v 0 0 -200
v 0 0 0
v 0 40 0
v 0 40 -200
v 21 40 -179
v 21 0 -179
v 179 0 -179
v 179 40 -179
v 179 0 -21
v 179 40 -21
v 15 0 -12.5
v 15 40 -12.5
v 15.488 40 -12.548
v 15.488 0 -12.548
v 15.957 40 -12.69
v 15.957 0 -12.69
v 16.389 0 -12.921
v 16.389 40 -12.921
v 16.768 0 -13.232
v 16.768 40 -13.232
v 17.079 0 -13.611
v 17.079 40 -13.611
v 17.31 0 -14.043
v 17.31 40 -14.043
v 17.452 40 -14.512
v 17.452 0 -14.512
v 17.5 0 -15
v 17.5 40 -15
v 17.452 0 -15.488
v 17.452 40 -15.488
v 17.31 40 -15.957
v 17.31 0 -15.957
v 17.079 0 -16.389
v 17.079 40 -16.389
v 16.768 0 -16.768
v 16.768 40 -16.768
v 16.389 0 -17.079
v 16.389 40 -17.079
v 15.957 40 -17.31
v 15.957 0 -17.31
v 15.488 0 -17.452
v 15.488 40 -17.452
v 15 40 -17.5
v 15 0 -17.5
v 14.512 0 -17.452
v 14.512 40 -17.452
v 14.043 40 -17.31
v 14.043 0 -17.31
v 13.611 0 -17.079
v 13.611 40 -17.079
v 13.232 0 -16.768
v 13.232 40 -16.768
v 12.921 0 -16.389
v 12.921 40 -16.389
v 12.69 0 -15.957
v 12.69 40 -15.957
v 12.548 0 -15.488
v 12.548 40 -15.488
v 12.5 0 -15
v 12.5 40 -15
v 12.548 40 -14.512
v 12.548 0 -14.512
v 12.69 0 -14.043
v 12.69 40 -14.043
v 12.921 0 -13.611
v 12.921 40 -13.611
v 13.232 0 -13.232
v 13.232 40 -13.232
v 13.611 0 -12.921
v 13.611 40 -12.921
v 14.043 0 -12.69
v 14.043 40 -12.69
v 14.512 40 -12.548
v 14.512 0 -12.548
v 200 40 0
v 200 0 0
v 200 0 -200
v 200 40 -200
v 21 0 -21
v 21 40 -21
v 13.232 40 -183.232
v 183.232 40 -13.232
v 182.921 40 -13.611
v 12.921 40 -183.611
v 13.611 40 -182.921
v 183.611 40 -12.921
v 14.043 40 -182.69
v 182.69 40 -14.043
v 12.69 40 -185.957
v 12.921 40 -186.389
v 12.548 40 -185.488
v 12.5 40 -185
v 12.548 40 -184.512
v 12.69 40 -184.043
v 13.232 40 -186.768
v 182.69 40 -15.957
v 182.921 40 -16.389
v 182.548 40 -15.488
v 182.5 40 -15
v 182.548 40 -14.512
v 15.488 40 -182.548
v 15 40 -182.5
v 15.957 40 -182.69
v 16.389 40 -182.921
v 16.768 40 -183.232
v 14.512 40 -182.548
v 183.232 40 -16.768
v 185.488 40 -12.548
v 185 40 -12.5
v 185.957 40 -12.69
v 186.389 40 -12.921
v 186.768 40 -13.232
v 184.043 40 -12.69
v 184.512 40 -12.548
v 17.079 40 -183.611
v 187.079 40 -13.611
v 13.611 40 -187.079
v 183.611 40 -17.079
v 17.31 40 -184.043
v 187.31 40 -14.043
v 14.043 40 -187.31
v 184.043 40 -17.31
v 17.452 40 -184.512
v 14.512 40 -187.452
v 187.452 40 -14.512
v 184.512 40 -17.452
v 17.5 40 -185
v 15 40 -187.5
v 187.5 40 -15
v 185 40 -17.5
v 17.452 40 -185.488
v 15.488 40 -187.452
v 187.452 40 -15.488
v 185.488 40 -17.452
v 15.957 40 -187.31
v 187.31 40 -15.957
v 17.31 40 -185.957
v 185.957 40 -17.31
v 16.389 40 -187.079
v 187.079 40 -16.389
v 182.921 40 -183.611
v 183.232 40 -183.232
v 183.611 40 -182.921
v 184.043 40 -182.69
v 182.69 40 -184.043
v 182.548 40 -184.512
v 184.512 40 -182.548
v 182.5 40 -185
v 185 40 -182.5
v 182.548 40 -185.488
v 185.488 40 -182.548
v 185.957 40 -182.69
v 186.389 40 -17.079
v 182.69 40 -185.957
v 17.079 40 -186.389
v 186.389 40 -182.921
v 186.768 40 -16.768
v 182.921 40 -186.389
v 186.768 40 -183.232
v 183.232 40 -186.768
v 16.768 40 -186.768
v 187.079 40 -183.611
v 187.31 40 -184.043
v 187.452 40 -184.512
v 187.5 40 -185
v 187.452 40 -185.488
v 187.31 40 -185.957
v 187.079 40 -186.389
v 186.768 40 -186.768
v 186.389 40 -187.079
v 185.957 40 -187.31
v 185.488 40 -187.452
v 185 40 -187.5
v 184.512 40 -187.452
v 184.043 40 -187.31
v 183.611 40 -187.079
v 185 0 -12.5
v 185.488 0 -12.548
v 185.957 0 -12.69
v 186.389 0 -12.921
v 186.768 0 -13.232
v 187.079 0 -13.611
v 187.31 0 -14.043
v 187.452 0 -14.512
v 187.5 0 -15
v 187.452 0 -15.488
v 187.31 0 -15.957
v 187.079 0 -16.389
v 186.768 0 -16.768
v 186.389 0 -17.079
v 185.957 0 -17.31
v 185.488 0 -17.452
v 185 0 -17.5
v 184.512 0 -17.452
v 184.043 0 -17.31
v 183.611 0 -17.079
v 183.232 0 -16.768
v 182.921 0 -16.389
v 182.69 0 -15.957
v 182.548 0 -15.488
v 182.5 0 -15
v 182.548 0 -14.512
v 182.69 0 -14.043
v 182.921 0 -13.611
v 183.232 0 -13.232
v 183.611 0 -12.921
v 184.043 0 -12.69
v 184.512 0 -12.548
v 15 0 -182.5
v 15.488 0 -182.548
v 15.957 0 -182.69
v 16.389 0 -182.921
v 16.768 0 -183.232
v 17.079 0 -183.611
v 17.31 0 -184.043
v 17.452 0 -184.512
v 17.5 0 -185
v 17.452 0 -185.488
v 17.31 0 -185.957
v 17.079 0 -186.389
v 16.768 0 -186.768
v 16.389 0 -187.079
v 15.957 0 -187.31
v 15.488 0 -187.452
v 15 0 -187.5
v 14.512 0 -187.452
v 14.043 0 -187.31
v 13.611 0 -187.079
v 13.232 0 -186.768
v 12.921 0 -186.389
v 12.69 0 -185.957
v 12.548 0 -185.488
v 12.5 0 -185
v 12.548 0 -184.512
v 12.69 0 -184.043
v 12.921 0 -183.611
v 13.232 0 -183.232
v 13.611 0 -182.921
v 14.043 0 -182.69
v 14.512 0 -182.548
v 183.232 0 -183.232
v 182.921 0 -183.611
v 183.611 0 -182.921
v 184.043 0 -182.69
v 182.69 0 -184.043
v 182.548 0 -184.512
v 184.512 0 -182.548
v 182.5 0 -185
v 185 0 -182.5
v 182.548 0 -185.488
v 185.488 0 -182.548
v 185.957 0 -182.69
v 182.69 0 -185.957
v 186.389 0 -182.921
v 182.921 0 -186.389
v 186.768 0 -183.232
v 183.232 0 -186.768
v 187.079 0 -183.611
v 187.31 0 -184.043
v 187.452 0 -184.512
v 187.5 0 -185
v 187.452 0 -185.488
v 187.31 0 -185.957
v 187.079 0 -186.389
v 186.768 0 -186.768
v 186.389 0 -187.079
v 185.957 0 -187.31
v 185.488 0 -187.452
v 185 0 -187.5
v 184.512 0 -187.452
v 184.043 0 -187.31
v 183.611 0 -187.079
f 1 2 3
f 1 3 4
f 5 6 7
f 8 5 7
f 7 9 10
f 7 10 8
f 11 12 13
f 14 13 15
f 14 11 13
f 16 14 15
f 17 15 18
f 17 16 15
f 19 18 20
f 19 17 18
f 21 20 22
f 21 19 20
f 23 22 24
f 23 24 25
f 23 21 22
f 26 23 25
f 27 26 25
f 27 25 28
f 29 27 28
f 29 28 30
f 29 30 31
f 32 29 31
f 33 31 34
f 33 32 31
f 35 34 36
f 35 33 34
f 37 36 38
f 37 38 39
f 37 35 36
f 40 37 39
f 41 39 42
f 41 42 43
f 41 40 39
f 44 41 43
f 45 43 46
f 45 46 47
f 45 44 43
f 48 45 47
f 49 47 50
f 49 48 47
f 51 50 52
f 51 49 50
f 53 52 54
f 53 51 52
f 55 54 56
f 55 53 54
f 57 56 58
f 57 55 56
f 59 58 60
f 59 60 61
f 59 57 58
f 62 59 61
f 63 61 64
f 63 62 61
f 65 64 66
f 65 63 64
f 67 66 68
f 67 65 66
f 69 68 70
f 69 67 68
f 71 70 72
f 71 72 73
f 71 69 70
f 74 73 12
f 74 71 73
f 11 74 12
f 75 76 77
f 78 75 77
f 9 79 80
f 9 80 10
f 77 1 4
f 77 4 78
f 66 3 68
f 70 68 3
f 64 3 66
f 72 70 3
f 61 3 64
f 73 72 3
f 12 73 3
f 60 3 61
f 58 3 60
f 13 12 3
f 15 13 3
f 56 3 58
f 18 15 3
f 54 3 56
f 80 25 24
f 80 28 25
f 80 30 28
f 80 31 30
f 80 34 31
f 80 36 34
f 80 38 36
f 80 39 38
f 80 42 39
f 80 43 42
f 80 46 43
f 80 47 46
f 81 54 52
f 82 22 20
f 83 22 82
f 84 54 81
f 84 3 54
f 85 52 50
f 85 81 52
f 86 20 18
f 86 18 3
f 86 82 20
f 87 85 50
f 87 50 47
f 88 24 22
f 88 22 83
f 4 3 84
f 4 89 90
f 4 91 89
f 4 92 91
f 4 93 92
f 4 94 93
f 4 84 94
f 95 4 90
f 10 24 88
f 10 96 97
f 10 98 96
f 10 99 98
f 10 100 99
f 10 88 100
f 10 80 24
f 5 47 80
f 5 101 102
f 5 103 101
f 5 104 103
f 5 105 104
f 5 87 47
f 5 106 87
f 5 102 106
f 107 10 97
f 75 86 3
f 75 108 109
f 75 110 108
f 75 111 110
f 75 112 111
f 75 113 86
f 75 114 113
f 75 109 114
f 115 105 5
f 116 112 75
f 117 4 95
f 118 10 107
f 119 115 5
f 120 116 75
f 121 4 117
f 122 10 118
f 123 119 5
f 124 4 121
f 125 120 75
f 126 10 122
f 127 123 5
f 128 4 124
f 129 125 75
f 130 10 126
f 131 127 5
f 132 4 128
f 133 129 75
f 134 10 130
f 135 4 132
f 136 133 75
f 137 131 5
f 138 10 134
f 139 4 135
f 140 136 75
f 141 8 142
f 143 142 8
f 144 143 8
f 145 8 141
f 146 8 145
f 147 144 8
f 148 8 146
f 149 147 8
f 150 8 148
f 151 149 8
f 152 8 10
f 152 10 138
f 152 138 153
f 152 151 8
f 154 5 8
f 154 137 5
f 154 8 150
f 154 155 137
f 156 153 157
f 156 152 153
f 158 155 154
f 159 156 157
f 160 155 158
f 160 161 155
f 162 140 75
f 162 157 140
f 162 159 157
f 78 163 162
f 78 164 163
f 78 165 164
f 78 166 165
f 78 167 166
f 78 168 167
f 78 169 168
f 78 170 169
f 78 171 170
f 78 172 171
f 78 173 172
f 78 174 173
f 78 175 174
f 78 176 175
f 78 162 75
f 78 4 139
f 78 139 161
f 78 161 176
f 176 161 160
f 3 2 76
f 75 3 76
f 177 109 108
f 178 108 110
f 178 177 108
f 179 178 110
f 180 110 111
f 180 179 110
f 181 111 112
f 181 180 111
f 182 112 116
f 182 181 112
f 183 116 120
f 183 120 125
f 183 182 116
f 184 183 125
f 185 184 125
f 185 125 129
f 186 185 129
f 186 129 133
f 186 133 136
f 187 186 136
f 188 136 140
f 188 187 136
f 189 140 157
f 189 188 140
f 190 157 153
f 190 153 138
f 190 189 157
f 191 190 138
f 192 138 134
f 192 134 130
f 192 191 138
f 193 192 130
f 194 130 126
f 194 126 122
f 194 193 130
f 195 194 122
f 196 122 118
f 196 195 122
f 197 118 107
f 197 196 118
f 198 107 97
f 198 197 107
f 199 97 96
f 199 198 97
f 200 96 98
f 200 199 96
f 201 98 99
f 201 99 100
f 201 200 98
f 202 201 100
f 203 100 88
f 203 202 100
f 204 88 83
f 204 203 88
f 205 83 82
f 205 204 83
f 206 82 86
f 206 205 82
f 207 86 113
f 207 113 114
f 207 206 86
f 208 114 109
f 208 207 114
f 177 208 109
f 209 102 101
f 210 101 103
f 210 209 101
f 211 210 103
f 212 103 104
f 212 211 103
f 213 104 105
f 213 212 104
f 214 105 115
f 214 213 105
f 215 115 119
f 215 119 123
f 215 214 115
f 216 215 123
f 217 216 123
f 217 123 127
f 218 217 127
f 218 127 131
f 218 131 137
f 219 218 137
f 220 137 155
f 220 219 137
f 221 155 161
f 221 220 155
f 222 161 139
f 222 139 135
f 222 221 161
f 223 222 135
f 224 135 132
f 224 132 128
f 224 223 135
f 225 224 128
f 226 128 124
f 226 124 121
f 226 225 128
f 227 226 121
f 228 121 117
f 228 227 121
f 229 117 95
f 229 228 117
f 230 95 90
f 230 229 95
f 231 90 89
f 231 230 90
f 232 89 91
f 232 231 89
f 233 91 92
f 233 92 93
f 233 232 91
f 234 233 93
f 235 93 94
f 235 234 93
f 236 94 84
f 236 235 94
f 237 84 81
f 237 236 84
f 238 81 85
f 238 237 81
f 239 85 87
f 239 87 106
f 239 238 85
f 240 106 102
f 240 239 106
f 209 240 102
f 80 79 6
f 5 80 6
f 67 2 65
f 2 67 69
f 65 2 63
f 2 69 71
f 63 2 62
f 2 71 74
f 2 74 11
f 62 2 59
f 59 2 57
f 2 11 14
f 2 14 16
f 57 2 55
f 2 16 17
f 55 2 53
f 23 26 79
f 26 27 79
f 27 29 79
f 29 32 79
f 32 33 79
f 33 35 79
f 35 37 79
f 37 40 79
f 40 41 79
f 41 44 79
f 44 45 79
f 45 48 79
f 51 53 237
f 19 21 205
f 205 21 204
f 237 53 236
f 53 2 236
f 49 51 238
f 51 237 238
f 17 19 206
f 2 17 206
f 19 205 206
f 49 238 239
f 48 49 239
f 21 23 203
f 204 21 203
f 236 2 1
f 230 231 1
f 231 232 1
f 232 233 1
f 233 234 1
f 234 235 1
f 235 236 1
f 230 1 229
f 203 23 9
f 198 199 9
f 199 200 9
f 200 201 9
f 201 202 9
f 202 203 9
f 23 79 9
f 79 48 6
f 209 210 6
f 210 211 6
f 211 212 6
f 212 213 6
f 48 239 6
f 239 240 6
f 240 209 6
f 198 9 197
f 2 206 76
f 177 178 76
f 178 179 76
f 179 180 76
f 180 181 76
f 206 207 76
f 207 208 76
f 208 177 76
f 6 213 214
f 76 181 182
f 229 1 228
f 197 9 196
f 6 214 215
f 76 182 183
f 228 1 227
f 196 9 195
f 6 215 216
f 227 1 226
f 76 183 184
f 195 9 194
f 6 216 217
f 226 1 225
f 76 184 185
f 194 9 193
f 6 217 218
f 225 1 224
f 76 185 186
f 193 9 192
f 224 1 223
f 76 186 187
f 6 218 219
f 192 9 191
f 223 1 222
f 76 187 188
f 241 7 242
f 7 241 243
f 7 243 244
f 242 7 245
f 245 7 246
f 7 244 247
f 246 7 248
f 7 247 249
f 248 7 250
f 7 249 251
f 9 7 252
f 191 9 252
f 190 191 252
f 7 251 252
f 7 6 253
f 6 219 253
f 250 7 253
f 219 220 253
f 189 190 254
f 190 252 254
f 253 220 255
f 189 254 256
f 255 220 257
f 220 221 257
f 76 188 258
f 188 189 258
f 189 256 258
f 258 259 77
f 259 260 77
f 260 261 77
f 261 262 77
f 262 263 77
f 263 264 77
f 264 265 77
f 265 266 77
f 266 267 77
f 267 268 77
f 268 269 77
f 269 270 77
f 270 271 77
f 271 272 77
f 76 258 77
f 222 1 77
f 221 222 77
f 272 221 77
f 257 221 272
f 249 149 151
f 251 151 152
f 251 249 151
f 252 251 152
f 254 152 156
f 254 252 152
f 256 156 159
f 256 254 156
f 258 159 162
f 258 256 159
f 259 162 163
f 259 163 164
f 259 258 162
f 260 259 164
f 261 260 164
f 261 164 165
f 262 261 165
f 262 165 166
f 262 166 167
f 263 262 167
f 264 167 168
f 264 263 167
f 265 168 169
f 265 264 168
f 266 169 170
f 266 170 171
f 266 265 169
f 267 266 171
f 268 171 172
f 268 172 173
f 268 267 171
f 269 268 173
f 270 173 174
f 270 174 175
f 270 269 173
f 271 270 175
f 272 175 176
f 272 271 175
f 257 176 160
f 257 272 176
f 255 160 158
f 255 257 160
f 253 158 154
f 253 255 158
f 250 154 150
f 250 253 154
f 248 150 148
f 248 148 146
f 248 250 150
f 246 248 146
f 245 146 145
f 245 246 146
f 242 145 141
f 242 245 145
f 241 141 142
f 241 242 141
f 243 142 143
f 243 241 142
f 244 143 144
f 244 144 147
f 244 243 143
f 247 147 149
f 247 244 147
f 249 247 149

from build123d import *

# Parameters (mm, degrees)
CROQUIS1_W              = 200
CROQUIS1_H              = 200
CROQUIS1_R              = 2.5
CROQUIS1_W_2            = 158
CROQUIS1_H_2            = 158
SALIENTE_EXTRUIR1_DEPTH = 40


with BuildPart() as part:
    # Croquis1 → Saliente-Extruir1 (new body)
    with BuildSketch(Plane(origin=(0, 0, 0), x_dir=(1, 0, 0), z_dir=(0, 1, 0))):
        with Locations((100, 100)):
            Rectangle(CROQUIS1_W, CROQUIS1_H)
        with Locations(Location((185, 185, 0), (0, 0, 270))):
            Circle(CROQUIS1_R, mode=Mode.SUBTRACT)
        with Locations(Location((185, 15, 0), (0, 0, 270))):
            Circle(CROQUIS1_R, mode=Mode.SUBTRACT)
        with Locations(Location((15, 15, 0), (0, 0, 270))):
            Circle(CROQUIS1_R, mode=Mode.SUBTRACT)
        with Locations(Location((15, 185, 0), (0, 0, 270))):
            Circle(CROQUIS1_R, mode=Mode.SUBTRACT)
        with Locations((100, 100)):
            Rectangle(CROQUIS1_W_2, CROQUIS1_H_2, mode=Mode.SUBTRACT)
    extrude(amount=SALIENTE_EXTRUIR1_DEPTH)


solid = part.part
